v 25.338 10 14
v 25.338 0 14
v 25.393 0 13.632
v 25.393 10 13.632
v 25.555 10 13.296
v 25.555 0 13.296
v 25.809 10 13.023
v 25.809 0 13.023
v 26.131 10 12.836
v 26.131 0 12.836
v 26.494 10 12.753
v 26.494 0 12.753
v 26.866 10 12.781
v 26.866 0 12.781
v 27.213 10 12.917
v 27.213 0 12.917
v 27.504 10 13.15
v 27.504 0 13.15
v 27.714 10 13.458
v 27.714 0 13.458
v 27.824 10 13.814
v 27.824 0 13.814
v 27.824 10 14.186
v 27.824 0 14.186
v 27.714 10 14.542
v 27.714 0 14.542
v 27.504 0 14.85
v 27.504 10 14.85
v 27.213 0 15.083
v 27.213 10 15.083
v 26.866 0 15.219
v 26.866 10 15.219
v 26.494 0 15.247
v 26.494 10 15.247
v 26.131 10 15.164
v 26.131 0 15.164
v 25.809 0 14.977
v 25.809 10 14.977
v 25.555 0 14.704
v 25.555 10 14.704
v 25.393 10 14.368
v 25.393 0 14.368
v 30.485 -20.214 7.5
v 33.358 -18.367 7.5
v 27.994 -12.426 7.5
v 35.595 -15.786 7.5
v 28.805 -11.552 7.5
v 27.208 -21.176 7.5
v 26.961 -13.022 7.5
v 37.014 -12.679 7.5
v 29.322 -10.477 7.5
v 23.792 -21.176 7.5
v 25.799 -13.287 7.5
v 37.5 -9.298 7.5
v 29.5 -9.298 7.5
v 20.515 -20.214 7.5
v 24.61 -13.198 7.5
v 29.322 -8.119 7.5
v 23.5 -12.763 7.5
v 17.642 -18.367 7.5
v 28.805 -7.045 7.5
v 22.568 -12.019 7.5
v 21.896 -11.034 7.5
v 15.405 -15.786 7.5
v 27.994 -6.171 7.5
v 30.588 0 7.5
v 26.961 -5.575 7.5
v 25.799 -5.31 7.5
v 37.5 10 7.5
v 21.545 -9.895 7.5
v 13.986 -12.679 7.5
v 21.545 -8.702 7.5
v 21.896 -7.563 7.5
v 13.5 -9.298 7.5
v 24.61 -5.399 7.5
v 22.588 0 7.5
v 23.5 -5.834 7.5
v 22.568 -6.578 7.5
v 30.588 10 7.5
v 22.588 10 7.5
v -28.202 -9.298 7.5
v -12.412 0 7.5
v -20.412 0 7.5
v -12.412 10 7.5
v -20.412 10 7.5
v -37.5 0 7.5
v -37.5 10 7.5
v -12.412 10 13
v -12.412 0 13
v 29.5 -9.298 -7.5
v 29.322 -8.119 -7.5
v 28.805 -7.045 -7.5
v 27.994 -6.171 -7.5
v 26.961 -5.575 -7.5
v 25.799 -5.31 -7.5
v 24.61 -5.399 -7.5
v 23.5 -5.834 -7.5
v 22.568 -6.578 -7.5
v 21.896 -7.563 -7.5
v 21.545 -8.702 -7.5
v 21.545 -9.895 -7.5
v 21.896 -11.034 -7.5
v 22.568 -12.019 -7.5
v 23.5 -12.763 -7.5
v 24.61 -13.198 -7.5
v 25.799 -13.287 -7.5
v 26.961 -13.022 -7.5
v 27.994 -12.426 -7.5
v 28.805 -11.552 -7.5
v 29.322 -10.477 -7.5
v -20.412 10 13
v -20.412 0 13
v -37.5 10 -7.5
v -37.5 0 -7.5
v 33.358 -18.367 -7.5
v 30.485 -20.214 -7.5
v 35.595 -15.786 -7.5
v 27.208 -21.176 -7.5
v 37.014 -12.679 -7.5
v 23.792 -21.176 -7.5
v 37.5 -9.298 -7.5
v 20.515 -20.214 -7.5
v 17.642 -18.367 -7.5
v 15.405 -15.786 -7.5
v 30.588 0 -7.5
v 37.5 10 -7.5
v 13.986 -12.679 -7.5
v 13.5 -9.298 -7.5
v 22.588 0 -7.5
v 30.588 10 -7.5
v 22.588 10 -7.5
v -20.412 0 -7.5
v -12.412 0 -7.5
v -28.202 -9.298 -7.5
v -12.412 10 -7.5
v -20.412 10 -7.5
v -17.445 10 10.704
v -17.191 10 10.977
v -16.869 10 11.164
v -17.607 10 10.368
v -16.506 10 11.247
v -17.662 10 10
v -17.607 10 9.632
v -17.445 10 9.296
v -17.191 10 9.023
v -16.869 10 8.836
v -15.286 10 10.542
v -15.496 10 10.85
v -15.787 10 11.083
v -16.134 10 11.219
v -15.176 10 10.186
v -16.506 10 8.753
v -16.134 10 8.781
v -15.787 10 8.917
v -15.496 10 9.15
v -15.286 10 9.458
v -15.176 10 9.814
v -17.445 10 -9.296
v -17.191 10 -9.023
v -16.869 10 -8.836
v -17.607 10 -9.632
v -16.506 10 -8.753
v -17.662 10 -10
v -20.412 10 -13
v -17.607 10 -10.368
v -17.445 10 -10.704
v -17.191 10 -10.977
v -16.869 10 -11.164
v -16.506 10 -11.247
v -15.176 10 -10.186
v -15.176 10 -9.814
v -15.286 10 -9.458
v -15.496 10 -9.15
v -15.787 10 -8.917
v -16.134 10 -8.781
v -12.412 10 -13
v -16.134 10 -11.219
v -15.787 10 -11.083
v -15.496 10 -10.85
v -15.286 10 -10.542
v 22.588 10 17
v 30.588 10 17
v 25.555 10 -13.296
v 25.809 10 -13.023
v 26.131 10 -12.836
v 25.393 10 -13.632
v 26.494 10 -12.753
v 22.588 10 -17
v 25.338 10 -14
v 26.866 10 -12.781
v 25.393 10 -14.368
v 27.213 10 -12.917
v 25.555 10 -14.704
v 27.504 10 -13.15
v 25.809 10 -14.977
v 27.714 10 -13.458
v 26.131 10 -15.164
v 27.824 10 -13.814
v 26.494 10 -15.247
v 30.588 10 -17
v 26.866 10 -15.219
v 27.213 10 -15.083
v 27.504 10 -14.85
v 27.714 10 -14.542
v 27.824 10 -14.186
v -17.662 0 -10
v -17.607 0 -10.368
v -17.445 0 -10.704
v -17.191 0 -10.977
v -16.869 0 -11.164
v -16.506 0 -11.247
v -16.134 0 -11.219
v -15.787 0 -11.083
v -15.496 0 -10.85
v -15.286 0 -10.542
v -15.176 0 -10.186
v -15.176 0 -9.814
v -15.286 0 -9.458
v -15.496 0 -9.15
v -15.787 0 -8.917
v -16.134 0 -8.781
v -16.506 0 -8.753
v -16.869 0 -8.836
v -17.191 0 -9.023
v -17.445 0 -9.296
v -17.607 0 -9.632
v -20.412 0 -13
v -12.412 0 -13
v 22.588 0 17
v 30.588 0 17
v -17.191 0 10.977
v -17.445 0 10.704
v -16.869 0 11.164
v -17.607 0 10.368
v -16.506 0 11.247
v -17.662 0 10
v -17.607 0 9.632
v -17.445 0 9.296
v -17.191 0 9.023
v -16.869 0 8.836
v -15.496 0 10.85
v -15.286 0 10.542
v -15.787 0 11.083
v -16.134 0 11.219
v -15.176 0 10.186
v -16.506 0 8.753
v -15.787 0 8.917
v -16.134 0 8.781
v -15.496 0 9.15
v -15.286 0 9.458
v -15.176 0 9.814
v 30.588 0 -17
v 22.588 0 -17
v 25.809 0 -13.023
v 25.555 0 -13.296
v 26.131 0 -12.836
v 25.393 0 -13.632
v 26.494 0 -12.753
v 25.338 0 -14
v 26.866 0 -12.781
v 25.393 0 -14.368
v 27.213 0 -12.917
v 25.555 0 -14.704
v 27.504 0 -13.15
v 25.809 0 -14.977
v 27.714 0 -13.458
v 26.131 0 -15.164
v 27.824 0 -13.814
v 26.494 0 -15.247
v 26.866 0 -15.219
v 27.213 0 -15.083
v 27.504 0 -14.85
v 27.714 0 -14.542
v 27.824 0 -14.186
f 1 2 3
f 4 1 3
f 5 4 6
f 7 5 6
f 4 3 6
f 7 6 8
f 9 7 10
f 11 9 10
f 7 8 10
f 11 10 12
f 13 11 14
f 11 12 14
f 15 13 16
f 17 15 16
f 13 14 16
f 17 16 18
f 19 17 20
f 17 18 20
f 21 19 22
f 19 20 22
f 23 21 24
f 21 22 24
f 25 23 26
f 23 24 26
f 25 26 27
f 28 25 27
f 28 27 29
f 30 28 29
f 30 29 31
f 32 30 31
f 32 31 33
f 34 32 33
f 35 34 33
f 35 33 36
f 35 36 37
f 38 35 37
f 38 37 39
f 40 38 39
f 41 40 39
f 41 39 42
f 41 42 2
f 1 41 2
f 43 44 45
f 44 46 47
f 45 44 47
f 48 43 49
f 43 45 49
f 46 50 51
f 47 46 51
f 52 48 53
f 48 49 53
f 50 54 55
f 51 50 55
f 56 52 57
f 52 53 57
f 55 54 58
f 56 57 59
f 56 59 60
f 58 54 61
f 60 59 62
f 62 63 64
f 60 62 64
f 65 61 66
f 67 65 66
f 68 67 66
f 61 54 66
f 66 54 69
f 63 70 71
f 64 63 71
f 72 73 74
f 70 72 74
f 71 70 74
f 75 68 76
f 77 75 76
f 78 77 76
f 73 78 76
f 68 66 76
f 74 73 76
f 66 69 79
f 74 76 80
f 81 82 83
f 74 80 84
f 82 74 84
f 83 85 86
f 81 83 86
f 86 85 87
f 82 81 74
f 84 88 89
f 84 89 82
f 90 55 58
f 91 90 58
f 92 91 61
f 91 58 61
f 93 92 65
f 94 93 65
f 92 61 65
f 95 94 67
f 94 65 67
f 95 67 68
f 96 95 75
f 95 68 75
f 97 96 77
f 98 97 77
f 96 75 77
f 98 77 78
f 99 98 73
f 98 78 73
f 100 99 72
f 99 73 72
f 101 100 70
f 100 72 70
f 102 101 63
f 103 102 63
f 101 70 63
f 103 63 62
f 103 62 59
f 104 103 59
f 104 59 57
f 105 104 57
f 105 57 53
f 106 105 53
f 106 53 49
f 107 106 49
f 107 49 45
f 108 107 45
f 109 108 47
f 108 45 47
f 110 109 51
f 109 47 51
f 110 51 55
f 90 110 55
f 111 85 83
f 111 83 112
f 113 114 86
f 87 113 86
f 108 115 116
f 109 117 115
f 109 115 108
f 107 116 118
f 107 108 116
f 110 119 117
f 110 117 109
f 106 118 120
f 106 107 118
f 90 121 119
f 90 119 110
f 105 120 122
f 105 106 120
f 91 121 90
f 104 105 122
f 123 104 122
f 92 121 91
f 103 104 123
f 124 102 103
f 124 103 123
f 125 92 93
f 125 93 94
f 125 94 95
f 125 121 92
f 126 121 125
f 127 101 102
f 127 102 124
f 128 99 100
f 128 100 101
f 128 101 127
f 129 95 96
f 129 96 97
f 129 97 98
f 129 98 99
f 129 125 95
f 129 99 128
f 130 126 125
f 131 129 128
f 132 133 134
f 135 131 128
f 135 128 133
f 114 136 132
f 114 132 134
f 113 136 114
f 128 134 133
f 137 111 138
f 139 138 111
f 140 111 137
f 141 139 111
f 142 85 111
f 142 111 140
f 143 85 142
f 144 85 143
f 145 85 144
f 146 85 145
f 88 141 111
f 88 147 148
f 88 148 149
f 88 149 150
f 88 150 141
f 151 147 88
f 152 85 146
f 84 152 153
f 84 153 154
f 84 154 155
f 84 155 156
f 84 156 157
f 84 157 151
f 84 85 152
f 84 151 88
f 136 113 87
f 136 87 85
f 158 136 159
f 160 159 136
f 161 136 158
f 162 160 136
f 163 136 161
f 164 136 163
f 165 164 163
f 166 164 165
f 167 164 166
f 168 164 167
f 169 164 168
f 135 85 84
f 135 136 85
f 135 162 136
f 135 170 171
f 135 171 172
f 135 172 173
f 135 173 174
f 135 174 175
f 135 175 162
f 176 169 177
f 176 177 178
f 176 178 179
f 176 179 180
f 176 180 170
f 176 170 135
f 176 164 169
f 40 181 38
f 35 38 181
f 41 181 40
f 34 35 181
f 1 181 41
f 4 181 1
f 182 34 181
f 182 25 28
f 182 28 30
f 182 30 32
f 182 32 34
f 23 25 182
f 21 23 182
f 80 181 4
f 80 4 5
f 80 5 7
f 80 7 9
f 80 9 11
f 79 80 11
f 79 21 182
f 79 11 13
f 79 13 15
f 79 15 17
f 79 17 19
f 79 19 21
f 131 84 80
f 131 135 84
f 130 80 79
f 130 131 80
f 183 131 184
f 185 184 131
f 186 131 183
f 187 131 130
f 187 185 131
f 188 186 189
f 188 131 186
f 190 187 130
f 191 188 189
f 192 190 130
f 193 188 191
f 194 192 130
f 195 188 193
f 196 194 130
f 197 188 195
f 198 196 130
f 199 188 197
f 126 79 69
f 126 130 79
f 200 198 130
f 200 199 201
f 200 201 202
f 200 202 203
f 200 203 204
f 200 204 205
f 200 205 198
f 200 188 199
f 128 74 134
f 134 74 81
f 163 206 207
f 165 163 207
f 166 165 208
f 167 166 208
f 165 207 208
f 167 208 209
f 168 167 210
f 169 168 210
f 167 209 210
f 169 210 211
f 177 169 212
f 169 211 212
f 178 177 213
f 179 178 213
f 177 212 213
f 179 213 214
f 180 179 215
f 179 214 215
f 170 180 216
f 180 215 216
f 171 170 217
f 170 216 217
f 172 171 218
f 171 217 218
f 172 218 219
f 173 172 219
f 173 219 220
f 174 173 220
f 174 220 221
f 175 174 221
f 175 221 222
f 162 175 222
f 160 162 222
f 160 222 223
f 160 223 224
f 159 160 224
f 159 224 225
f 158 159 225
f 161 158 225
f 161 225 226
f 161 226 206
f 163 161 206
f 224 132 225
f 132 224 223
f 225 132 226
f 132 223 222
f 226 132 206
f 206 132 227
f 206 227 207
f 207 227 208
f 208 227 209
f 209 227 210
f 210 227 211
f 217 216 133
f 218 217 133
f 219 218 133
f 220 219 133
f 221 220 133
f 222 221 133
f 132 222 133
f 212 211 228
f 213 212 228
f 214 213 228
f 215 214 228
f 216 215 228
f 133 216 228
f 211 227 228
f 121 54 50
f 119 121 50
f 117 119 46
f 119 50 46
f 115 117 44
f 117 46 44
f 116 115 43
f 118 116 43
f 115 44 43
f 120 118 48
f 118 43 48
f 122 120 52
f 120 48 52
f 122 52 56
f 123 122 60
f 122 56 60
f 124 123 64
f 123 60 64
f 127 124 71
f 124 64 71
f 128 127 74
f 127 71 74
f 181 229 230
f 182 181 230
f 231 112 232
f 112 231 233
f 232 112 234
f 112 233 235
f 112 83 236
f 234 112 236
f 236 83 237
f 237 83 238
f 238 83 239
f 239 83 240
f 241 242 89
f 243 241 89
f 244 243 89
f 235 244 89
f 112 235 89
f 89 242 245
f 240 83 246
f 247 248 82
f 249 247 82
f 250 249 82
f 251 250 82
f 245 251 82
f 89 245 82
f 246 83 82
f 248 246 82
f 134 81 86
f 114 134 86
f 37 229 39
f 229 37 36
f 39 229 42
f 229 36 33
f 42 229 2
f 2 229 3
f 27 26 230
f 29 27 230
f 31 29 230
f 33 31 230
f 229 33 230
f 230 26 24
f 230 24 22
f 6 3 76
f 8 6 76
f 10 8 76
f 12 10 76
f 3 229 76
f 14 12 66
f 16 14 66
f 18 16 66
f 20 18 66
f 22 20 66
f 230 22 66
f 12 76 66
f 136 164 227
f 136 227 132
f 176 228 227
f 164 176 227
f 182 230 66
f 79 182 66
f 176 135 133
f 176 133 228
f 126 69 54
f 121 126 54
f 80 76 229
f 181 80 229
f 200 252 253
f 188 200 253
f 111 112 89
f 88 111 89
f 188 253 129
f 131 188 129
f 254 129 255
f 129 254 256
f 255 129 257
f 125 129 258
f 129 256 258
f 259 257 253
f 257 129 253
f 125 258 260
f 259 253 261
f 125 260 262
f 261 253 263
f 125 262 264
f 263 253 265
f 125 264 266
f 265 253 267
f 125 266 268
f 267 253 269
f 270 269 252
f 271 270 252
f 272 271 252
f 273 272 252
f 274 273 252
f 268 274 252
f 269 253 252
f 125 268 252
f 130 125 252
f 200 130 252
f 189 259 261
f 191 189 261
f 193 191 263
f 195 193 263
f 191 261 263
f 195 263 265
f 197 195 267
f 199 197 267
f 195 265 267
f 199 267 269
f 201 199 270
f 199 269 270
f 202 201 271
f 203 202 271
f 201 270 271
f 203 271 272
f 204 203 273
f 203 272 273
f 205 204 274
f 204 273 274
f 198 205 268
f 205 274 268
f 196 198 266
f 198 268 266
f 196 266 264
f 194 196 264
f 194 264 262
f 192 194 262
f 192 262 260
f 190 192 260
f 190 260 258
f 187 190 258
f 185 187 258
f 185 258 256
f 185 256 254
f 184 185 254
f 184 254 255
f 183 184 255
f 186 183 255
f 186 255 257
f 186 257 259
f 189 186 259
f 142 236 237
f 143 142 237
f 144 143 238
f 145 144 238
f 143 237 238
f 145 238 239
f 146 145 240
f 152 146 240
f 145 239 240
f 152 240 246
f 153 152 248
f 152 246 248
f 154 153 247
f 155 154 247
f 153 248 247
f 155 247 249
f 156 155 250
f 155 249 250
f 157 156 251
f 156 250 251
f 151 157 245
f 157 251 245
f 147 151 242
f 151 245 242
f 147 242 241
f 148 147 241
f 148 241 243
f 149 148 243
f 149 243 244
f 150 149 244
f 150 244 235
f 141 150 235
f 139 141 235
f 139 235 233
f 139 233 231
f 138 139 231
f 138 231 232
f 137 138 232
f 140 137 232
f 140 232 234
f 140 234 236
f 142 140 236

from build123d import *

# Parameters (mm, degrees)
EXTRUDE_1_DEPTH    = 10
HOLE_WIZARD_M3_1_D = 2.5
SKETCH_6_R         = 4
EXTRUDE_2_DEPTH    = 15


with BuildPart() as part:
    # 草图2 → 凸台-拉伸1 (new body)
    with BuildSketch(Plane(origin=(0, 0, 0), x_dir=(1, 0, 0), z_dir=(0, 1, 0))):
        Polygon((37.5, 7.5), (30.587879709, 7.5), (30.587879709, 17), (22.587879709, 17), (22.587879709, 7.5), (-12.412120291, 7.5), (-12.412120291, 13), (-20.412120291, 13), (-20.412120291, 7.5), (-37.5, 7.5), (-37.5, -7.5), (-20.412120291, -7.5), (-20.412120291, -13), (-12.412120291, -13), (-12.412120291, -7.5), (22.587879709, -7.5), (22.587879709, -17), (30.587879709, -17), (30.587879709, -7.5), (37.5, -7.5), align=None)
    extrude(amount=EXTRUDE_1_DEPTH)

    # M3 螺纹孔1 (through all)
    with Locations(Plane(origin=(0, 10, 0), x_dir=(1, 0, 0), z_dir=(0, 1, 0))):
        with Locations((-16.412120291, 10), (-16.412120291, -10), (26.587879709, 14), (26.587879709, -14)):
            Hole(HOLE_WIZARD_M3_1_D / 2)

    # 草图6 → 凸台-拉伸2 (add)
    with BuildSketch(Plane.XY.offset(7.5)):
        with BuildLine():
            Line((-37.5, 0), (37.5, 0))
            Line((37.5, 0), (37.5, -9.298476379))
            ThreePointArc((37.5, -9.298476379), (25.5, -21.298476379), (13.5, -9.298476379))
            Line((13.5, -9.298476379), (-28.201523621, -9.298476379))
            Line((-28.201523621, -9.298476379), (-37.5, 0))
        make_face()
        with Locations((25.5, -9.298476379)):
            Circle(SKETCH_6_R, mode=Mode.SUBTRACT)
    extrude(amount=-EXTRUDE_2_DEPTH)


solid = part.part
